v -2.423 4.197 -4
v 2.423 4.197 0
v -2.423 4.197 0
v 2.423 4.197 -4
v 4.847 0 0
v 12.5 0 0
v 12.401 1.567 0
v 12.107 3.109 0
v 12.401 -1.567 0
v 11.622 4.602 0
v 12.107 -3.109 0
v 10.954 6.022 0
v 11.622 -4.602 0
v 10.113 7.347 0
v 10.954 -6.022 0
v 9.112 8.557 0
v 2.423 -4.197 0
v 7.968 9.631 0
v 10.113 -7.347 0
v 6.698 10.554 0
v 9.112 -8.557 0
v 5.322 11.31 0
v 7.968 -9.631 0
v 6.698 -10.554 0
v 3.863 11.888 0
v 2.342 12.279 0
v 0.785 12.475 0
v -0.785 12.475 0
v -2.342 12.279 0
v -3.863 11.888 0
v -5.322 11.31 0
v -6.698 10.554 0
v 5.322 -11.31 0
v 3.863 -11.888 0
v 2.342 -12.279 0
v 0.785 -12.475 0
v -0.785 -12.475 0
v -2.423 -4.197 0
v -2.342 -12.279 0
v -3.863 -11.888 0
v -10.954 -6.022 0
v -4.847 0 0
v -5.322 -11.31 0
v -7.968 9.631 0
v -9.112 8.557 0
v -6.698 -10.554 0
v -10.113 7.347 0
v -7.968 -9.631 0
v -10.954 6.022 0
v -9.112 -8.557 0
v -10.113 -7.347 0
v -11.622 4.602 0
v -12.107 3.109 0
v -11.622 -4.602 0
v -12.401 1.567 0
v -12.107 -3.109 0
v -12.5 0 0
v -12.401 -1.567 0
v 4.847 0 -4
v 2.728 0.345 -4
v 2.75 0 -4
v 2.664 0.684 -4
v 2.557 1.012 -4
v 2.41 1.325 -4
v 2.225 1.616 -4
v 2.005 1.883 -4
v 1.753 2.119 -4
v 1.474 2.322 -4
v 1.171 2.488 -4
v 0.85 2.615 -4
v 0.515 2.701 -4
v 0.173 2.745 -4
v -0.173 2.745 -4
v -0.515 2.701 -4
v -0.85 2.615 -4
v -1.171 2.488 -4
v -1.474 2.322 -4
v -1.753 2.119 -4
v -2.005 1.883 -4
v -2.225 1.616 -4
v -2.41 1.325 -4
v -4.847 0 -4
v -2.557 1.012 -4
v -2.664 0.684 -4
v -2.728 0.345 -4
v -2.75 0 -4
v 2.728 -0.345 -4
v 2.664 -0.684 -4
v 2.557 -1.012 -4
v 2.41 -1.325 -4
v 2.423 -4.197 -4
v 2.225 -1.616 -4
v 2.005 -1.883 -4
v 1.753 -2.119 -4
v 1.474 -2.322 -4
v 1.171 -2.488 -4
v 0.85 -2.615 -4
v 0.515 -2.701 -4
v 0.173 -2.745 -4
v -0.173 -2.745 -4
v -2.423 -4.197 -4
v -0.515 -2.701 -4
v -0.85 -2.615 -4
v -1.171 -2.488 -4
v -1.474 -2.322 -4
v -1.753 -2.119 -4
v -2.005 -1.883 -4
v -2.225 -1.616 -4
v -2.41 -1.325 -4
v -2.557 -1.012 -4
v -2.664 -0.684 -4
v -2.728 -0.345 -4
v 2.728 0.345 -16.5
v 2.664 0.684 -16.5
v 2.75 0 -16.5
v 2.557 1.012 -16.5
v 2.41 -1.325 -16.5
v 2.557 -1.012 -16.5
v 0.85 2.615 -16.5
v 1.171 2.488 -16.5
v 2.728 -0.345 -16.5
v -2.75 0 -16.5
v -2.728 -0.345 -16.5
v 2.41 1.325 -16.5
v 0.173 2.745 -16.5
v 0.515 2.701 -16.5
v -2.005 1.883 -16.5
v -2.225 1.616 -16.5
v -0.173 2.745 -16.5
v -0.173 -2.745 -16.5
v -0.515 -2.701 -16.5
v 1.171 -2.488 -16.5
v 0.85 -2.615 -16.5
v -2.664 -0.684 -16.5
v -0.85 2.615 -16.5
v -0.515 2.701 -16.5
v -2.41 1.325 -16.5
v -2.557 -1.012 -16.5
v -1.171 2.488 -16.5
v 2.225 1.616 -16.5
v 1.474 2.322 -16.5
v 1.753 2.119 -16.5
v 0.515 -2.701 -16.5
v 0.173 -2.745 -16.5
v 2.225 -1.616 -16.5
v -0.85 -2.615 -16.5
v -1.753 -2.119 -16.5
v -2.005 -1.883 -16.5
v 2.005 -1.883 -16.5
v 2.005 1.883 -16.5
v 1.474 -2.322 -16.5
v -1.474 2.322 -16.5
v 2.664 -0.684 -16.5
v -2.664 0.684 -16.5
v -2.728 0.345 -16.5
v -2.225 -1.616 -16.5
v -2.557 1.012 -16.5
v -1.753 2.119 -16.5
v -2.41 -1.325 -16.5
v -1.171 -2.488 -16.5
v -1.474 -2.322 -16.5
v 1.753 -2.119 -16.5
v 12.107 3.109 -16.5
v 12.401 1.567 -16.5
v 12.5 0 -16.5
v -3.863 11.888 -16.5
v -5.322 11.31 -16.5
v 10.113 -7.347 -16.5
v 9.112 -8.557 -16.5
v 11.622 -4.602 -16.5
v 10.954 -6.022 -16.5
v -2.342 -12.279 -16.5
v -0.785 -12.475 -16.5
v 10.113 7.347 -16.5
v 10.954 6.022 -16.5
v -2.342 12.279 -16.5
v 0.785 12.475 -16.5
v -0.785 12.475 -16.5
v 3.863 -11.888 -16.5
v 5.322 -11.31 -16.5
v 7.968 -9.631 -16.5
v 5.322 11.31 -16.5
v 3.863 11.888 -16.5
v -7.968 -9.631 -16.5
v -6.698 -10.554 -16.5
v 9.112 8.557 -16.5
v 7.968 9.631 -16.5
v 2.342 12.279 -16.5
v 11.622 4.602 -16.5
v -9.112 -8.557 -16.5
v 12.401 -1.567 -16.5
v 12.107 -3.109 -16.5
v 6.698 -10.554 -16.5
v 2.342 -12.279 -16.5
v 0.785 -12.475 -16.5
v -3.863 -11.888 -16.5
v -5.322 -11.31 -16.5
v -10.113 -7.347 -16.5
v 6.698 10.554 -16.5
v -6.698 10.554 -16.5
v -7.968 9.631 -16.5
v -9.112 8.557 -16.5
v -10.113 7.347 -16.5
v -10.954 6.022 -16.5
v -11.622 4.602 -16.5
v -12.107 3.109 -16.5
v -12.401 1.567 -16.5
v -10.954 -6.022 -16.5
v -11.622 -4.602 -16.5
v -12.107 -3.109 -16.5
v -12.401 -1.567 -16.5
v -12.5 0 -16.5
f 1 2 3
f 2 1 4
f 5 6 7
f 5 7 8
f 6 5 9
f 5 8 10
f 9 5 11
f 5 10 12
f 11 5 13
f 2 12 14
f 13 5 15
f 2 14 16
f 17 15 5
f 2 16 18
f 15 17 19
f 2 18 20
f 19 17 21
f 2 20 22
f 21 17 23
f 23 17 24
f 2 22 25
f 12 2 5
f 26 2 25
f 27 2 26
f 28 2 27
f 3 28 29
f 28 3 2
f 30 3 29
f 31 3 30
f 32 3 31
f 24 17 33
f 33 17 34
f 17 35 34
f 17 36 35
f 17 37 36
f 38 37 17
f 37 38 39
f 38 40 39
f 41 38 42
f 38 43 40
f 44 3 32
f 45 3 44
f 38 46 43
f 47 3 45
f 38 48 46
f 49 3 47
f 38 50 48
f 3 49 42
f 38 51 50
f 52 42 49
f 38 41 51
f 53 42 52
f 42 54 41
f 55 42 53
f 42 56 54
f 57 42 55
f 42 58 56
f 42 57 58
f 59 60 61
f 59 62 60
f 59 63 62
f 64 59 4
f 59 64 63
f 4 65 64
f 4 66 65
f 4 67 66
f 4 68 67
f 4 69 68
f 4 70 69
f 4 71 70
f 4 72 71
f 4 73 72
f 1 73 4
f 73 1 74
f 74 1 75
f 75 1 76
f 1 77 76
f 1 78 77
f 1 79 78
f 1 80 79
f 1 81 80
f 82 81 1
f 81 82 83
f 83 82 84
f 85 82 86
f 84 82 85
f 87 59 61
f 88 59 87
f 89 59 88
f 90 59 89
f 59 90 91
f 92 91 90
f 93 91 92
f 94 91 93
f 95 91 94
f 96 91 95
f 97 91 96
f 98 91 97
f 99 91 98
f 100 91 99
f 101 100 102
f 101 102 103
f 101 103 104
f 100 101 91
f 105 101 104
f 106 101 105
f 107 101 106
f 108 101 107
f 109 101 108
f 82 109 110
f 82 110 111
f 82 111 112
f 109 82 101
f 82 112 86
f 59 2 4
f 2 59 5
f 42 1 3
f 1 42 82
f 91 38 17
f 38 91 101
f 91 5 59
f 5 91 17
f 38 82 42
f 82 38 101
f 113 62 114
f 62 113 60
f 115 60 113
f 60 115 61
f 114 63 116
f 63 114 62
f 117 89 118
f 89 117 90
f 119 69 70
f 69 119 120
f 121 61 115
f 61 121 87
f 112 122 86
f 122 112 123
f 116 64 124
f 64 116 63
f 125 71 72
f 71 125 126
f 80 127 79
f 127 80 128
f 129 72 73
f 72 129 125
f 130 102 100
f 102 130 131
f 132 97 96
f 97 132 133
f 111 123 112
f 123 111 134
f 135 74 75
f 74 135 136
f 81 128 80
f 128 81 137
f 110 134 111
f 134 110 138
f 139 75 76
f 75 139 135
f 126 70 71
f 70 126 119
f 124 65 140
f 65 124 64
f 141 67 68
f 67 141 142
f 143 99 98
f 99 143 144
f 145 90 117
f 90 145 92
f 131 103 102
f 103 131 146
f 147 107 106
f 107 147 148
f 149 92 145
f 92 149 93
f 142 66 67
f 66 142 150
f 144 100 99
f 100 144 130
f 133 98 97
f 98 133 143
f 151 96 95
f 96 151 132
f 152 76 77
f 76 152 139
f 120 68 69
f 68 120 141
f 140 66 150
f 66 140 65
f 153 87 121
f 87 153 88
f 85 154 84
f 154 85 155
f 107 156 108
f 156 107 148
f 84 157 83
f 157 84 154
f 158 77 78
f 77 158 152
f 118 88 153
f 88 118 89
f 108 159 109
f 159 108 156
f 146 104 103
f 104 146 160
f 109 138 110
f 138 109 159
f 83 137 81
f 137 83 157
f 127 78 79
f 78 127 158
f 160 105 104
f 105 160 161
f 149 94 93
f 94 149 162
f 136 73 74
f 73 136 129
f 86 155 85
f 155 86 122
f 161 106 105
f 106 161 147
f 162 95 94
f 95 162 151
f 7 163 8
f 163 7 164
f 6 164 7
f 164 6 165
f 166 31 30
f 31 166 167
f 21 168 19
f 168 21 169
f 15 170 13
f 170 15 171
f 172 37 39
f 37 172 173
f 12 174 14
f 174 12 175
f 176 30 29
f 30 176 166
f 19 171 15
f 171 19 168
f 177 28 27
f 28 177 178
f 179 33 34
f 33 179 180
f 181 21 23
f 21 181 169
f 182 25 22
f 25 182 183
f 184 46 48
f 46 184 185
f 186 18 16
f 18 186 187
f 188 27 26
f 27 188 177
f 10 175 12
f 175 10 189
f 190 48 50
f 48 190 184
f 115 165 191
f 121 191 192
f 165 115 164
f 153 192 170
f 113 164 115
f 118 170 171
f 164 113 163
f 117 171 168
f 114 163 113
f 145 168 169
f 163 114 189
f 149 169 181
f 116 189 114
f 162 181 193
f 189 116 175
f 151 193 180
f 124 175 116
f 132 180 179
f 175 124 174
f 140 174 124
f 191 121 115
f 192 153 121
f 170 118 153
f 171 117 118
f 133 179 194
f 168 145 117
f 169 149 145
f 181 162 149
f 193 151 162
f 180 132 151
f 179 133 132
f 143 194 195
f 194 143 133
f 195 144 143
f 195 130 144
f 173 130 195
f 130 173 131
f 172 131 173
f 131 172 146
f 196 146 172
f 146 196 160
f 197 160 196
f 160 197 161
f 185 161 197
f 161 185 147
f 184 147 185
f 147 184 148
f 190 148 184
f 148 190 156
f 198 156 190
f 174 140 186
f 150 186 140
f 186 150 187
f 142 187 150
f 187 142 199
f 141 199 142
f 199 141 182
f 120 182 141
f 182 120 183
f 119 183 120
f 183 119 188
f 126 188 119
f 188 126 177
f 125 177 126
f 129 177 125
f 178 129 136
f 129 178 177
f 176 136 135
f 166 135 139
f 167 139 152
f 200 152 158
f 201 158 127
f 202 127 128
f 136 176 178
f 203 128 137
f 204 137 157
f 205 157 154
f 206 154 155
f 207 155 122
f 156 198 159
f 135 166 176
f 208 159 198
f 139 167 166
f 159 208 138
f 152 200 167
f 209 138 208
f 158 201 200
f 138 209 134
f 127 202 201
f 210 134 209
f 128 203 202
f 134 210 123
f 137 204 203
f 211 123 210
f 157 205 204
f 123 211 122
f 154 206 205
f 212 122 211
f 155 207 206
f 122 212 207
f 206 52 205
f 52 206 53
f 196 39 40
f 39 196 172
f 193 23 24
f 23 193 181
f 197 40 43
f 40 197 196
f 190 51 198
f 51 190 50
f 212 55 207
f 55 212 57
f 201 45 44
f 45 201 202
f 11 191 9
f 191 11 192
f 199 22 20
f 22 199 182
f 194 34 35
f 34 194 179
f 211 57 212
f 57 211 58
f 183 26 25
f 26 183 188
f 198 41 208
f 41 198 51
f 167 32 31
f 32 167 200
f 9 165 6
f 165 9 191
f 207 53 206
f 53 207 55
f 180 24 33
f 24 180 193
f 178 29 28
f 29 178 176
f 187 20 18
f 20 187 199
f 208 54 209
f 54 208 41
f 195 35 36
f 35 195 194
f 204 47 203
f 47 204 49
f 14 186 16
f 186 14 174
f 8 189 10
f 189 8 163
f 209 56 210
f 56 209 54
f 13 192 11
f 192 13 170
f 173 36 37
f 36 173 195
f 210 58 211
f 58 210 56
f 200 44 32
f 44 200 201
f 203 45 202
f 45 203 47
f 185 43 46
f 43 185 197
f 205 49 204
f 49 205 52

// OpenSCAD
$fn = 50;


difference() {
	union() {
		translate(v = [0, 0, -16.5000000000]) {
			cylinder(h = 16.5000000000, r = 12.5000000000);
		}
	}
	union() {
		translate(v = [0, 0, 0]) {
			rotate(a = [0, 0, 0]) {
				difference() {
					union() {
						translate(v = [0, 0, -4]) {
							linear_extrude(height = 4) {
								polygon(points = [[4.8468000000, 0.0000000000], [2.4234000000, 4.1974519271], [-2.4234000000, 4.1974519271], [-4.8468000000, 0.0000000000], [-2.4234000000, -4.1974519271], [2.4234000000, -4.1974519271]]);
							}
						}
					}
					union();
				}
			}
		}
		#translate(v = [0, 0, -100.0000000000]) {
			cylinder(h = 200, r = 2.7500000000);
		}
	}
}
